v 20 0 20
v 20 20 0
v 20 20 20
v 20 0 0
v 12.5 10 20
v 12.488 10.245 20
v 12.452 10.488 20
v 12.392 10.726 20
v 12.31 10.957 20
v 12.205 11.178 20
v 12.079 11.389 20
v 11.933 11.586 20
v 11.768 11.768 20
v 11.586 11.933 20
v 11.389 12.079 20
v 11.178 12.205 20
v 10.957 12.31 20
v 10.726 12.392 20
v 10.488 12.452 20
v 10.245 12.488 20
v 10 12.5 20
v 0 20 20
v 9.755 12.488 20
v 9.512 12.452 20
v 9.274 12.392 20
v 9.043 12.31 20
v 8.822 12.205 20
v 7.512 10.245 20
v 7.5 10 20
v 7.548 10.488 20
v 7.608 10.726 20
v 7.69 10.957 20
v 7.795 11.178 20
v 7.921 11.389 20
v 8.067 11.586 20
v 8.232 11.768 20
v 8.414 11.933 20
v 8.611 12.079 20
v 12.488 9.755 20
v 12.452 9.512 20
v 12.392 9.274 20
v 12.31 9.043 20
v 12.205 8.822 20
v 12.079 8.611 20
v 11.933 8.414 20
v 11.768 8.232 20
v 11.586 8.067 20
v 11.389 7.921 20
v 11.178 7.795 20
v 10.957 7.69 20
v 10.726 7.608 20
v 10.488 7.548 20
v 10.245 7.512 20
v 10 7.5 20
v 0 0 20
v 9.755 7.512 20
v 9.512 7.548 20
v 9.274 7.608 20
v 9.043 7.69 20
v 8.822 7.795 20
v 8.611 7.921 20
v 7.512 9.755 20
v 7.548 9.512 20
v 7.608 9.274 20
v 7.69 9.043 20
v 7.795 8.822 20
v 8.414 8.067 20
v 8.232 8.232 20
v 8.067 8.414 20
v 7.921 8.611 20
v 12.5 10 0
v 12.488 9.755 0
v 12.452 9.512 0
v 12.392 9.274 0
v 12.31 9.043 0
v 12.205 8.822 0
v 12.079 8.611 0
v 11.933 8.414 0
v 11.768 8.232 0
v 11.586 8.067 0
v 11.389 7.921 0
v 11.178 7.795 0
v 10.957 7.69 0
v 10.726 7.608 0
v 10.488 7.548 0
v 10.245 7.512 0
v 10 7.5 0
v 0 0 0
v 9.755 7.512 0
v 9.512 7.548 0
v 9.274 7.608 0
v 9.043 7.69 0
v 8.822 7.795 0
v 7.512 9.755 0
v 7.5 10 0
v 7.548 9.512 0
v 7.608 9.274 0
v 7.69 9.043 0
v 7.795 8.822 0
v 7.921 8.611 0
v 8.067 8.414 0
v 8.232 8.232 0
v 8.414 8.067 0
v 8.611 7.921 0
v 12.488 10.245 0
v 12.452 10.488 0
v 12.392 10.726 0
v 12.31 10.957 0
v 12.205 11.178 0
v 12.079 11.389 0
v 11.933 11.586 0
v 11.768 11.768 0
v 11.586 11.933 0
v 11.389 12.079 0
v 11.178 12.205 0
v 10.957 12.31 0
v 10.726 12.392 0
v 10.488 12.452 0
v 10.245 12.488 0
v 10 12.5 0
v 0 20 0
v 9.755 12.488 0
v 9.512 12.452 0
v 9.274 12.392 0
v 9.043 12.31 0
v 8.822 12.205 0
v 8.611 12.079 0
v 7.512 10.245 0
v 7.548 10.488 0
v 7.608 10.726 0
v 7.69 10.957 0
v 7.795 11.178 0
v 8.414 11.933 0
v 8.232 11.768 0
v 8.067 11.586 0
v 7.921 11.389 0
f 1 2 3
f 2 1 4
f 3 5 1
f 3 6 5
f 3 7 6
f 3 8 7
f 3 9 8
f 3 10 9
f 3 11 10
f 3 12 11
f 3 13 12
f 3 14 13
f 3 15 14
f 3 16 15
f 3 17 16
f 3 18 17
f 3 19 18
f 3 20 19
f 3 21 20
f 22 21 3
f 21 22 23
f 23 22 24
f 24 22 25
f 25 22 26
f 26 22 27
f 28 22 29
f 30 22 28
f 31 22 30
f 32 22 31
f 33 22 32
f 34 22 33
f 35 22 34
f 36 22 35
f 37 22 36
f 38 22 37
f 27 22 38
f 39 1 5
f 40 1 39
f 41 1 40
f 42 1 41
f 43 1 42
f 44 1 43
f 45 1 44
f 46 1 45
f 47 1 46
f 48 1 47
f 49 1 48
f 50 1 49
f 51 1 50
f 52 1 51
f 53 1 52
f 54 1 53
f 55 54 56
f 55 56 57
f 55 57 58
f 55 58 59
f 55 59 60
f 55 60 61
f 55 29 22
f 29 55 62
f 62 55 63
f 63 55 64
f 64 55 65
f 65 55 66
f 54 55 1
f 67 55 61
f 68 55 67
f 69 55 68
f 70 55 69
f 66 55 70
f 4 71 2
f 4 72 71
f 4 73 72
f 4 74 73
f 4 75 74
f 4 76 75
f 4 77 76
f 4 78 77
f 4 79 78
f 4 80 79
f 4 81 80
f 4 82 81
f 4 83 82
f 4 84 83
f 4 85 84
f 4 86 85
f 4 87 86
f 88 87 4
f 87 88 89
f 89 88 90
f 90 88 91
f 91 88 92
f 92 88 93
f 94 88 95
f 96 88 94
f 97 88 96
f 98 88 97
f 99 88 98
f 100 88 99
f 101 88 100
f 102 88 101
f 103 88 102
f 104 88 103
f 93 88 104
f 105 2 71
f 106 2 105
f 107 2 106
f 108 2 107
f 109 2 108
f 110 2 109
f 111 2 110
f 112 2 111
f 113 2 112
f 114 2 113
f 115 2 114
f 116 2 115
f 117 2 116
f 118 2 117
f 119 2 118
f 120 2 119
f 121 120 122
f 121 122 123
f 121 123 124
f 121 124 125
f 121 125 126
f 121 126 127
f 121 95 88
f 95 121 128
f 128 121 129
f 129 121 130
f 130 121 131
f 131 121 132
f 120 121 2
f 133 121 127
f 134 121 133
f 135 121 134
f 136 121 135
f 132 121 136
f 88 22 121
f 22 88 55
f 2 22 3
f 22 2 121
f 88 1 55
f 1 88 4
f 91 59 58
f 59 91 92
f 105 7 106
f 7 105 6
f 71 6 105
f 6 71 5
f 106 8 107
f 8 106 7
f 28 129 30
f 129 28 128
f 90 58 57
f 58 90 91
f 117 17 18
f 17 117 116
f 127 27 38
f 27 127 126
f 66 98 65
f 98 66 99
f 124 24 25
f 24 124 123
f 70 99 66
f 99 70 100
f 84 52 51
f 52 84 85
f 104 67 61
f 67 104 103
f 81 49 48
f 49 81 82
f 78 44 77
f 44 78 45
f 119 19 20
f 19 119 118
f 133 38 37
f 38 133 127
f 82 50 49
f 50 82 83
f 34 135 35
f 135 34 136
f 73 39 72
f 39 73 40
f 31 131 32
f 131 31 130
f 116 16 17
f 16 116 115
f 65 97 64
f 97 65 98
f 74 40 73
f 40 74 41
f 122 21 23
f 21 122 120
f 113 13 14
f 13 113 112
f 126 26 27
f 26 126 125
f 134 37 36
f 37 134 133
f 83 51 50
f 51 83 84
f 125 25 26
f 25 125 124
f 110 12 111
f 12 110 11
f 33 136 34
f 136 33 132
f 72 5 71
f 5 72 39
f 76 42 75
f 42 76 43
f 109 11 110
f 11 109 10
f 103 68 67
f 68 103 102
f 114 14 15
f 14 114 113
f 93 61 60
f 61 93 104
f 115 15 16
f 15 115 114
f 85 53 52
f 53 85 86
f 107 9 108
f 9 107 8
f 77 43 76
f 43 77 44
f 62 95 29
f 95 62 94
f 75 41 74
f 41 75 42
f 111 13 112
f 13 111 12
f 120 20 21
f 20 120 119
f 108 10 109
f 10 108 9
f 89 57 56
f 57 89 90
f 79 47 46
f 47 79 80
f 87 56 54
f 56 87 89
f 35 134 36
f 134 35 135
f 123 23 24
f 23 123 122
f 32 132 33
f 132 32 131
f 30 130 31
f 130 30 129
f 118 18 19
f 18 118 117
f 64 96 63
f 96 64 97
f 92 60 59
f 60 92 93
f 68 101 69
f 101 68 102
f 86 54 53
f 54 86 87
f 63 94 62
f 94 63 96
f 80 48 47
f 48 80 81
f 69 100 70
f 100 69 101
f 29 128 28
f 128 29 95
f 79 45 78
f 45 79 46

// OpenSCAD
// Example fixture: 20 mm cube with a 5 mm through-hole
$fn = 64;
size = 20;
hole_d = 5;

difference() {
  cube(size, center = false);
  translate([size / 2, size / 2, -1])
    cylinder(h = size + 2, d = hole_d);
}
